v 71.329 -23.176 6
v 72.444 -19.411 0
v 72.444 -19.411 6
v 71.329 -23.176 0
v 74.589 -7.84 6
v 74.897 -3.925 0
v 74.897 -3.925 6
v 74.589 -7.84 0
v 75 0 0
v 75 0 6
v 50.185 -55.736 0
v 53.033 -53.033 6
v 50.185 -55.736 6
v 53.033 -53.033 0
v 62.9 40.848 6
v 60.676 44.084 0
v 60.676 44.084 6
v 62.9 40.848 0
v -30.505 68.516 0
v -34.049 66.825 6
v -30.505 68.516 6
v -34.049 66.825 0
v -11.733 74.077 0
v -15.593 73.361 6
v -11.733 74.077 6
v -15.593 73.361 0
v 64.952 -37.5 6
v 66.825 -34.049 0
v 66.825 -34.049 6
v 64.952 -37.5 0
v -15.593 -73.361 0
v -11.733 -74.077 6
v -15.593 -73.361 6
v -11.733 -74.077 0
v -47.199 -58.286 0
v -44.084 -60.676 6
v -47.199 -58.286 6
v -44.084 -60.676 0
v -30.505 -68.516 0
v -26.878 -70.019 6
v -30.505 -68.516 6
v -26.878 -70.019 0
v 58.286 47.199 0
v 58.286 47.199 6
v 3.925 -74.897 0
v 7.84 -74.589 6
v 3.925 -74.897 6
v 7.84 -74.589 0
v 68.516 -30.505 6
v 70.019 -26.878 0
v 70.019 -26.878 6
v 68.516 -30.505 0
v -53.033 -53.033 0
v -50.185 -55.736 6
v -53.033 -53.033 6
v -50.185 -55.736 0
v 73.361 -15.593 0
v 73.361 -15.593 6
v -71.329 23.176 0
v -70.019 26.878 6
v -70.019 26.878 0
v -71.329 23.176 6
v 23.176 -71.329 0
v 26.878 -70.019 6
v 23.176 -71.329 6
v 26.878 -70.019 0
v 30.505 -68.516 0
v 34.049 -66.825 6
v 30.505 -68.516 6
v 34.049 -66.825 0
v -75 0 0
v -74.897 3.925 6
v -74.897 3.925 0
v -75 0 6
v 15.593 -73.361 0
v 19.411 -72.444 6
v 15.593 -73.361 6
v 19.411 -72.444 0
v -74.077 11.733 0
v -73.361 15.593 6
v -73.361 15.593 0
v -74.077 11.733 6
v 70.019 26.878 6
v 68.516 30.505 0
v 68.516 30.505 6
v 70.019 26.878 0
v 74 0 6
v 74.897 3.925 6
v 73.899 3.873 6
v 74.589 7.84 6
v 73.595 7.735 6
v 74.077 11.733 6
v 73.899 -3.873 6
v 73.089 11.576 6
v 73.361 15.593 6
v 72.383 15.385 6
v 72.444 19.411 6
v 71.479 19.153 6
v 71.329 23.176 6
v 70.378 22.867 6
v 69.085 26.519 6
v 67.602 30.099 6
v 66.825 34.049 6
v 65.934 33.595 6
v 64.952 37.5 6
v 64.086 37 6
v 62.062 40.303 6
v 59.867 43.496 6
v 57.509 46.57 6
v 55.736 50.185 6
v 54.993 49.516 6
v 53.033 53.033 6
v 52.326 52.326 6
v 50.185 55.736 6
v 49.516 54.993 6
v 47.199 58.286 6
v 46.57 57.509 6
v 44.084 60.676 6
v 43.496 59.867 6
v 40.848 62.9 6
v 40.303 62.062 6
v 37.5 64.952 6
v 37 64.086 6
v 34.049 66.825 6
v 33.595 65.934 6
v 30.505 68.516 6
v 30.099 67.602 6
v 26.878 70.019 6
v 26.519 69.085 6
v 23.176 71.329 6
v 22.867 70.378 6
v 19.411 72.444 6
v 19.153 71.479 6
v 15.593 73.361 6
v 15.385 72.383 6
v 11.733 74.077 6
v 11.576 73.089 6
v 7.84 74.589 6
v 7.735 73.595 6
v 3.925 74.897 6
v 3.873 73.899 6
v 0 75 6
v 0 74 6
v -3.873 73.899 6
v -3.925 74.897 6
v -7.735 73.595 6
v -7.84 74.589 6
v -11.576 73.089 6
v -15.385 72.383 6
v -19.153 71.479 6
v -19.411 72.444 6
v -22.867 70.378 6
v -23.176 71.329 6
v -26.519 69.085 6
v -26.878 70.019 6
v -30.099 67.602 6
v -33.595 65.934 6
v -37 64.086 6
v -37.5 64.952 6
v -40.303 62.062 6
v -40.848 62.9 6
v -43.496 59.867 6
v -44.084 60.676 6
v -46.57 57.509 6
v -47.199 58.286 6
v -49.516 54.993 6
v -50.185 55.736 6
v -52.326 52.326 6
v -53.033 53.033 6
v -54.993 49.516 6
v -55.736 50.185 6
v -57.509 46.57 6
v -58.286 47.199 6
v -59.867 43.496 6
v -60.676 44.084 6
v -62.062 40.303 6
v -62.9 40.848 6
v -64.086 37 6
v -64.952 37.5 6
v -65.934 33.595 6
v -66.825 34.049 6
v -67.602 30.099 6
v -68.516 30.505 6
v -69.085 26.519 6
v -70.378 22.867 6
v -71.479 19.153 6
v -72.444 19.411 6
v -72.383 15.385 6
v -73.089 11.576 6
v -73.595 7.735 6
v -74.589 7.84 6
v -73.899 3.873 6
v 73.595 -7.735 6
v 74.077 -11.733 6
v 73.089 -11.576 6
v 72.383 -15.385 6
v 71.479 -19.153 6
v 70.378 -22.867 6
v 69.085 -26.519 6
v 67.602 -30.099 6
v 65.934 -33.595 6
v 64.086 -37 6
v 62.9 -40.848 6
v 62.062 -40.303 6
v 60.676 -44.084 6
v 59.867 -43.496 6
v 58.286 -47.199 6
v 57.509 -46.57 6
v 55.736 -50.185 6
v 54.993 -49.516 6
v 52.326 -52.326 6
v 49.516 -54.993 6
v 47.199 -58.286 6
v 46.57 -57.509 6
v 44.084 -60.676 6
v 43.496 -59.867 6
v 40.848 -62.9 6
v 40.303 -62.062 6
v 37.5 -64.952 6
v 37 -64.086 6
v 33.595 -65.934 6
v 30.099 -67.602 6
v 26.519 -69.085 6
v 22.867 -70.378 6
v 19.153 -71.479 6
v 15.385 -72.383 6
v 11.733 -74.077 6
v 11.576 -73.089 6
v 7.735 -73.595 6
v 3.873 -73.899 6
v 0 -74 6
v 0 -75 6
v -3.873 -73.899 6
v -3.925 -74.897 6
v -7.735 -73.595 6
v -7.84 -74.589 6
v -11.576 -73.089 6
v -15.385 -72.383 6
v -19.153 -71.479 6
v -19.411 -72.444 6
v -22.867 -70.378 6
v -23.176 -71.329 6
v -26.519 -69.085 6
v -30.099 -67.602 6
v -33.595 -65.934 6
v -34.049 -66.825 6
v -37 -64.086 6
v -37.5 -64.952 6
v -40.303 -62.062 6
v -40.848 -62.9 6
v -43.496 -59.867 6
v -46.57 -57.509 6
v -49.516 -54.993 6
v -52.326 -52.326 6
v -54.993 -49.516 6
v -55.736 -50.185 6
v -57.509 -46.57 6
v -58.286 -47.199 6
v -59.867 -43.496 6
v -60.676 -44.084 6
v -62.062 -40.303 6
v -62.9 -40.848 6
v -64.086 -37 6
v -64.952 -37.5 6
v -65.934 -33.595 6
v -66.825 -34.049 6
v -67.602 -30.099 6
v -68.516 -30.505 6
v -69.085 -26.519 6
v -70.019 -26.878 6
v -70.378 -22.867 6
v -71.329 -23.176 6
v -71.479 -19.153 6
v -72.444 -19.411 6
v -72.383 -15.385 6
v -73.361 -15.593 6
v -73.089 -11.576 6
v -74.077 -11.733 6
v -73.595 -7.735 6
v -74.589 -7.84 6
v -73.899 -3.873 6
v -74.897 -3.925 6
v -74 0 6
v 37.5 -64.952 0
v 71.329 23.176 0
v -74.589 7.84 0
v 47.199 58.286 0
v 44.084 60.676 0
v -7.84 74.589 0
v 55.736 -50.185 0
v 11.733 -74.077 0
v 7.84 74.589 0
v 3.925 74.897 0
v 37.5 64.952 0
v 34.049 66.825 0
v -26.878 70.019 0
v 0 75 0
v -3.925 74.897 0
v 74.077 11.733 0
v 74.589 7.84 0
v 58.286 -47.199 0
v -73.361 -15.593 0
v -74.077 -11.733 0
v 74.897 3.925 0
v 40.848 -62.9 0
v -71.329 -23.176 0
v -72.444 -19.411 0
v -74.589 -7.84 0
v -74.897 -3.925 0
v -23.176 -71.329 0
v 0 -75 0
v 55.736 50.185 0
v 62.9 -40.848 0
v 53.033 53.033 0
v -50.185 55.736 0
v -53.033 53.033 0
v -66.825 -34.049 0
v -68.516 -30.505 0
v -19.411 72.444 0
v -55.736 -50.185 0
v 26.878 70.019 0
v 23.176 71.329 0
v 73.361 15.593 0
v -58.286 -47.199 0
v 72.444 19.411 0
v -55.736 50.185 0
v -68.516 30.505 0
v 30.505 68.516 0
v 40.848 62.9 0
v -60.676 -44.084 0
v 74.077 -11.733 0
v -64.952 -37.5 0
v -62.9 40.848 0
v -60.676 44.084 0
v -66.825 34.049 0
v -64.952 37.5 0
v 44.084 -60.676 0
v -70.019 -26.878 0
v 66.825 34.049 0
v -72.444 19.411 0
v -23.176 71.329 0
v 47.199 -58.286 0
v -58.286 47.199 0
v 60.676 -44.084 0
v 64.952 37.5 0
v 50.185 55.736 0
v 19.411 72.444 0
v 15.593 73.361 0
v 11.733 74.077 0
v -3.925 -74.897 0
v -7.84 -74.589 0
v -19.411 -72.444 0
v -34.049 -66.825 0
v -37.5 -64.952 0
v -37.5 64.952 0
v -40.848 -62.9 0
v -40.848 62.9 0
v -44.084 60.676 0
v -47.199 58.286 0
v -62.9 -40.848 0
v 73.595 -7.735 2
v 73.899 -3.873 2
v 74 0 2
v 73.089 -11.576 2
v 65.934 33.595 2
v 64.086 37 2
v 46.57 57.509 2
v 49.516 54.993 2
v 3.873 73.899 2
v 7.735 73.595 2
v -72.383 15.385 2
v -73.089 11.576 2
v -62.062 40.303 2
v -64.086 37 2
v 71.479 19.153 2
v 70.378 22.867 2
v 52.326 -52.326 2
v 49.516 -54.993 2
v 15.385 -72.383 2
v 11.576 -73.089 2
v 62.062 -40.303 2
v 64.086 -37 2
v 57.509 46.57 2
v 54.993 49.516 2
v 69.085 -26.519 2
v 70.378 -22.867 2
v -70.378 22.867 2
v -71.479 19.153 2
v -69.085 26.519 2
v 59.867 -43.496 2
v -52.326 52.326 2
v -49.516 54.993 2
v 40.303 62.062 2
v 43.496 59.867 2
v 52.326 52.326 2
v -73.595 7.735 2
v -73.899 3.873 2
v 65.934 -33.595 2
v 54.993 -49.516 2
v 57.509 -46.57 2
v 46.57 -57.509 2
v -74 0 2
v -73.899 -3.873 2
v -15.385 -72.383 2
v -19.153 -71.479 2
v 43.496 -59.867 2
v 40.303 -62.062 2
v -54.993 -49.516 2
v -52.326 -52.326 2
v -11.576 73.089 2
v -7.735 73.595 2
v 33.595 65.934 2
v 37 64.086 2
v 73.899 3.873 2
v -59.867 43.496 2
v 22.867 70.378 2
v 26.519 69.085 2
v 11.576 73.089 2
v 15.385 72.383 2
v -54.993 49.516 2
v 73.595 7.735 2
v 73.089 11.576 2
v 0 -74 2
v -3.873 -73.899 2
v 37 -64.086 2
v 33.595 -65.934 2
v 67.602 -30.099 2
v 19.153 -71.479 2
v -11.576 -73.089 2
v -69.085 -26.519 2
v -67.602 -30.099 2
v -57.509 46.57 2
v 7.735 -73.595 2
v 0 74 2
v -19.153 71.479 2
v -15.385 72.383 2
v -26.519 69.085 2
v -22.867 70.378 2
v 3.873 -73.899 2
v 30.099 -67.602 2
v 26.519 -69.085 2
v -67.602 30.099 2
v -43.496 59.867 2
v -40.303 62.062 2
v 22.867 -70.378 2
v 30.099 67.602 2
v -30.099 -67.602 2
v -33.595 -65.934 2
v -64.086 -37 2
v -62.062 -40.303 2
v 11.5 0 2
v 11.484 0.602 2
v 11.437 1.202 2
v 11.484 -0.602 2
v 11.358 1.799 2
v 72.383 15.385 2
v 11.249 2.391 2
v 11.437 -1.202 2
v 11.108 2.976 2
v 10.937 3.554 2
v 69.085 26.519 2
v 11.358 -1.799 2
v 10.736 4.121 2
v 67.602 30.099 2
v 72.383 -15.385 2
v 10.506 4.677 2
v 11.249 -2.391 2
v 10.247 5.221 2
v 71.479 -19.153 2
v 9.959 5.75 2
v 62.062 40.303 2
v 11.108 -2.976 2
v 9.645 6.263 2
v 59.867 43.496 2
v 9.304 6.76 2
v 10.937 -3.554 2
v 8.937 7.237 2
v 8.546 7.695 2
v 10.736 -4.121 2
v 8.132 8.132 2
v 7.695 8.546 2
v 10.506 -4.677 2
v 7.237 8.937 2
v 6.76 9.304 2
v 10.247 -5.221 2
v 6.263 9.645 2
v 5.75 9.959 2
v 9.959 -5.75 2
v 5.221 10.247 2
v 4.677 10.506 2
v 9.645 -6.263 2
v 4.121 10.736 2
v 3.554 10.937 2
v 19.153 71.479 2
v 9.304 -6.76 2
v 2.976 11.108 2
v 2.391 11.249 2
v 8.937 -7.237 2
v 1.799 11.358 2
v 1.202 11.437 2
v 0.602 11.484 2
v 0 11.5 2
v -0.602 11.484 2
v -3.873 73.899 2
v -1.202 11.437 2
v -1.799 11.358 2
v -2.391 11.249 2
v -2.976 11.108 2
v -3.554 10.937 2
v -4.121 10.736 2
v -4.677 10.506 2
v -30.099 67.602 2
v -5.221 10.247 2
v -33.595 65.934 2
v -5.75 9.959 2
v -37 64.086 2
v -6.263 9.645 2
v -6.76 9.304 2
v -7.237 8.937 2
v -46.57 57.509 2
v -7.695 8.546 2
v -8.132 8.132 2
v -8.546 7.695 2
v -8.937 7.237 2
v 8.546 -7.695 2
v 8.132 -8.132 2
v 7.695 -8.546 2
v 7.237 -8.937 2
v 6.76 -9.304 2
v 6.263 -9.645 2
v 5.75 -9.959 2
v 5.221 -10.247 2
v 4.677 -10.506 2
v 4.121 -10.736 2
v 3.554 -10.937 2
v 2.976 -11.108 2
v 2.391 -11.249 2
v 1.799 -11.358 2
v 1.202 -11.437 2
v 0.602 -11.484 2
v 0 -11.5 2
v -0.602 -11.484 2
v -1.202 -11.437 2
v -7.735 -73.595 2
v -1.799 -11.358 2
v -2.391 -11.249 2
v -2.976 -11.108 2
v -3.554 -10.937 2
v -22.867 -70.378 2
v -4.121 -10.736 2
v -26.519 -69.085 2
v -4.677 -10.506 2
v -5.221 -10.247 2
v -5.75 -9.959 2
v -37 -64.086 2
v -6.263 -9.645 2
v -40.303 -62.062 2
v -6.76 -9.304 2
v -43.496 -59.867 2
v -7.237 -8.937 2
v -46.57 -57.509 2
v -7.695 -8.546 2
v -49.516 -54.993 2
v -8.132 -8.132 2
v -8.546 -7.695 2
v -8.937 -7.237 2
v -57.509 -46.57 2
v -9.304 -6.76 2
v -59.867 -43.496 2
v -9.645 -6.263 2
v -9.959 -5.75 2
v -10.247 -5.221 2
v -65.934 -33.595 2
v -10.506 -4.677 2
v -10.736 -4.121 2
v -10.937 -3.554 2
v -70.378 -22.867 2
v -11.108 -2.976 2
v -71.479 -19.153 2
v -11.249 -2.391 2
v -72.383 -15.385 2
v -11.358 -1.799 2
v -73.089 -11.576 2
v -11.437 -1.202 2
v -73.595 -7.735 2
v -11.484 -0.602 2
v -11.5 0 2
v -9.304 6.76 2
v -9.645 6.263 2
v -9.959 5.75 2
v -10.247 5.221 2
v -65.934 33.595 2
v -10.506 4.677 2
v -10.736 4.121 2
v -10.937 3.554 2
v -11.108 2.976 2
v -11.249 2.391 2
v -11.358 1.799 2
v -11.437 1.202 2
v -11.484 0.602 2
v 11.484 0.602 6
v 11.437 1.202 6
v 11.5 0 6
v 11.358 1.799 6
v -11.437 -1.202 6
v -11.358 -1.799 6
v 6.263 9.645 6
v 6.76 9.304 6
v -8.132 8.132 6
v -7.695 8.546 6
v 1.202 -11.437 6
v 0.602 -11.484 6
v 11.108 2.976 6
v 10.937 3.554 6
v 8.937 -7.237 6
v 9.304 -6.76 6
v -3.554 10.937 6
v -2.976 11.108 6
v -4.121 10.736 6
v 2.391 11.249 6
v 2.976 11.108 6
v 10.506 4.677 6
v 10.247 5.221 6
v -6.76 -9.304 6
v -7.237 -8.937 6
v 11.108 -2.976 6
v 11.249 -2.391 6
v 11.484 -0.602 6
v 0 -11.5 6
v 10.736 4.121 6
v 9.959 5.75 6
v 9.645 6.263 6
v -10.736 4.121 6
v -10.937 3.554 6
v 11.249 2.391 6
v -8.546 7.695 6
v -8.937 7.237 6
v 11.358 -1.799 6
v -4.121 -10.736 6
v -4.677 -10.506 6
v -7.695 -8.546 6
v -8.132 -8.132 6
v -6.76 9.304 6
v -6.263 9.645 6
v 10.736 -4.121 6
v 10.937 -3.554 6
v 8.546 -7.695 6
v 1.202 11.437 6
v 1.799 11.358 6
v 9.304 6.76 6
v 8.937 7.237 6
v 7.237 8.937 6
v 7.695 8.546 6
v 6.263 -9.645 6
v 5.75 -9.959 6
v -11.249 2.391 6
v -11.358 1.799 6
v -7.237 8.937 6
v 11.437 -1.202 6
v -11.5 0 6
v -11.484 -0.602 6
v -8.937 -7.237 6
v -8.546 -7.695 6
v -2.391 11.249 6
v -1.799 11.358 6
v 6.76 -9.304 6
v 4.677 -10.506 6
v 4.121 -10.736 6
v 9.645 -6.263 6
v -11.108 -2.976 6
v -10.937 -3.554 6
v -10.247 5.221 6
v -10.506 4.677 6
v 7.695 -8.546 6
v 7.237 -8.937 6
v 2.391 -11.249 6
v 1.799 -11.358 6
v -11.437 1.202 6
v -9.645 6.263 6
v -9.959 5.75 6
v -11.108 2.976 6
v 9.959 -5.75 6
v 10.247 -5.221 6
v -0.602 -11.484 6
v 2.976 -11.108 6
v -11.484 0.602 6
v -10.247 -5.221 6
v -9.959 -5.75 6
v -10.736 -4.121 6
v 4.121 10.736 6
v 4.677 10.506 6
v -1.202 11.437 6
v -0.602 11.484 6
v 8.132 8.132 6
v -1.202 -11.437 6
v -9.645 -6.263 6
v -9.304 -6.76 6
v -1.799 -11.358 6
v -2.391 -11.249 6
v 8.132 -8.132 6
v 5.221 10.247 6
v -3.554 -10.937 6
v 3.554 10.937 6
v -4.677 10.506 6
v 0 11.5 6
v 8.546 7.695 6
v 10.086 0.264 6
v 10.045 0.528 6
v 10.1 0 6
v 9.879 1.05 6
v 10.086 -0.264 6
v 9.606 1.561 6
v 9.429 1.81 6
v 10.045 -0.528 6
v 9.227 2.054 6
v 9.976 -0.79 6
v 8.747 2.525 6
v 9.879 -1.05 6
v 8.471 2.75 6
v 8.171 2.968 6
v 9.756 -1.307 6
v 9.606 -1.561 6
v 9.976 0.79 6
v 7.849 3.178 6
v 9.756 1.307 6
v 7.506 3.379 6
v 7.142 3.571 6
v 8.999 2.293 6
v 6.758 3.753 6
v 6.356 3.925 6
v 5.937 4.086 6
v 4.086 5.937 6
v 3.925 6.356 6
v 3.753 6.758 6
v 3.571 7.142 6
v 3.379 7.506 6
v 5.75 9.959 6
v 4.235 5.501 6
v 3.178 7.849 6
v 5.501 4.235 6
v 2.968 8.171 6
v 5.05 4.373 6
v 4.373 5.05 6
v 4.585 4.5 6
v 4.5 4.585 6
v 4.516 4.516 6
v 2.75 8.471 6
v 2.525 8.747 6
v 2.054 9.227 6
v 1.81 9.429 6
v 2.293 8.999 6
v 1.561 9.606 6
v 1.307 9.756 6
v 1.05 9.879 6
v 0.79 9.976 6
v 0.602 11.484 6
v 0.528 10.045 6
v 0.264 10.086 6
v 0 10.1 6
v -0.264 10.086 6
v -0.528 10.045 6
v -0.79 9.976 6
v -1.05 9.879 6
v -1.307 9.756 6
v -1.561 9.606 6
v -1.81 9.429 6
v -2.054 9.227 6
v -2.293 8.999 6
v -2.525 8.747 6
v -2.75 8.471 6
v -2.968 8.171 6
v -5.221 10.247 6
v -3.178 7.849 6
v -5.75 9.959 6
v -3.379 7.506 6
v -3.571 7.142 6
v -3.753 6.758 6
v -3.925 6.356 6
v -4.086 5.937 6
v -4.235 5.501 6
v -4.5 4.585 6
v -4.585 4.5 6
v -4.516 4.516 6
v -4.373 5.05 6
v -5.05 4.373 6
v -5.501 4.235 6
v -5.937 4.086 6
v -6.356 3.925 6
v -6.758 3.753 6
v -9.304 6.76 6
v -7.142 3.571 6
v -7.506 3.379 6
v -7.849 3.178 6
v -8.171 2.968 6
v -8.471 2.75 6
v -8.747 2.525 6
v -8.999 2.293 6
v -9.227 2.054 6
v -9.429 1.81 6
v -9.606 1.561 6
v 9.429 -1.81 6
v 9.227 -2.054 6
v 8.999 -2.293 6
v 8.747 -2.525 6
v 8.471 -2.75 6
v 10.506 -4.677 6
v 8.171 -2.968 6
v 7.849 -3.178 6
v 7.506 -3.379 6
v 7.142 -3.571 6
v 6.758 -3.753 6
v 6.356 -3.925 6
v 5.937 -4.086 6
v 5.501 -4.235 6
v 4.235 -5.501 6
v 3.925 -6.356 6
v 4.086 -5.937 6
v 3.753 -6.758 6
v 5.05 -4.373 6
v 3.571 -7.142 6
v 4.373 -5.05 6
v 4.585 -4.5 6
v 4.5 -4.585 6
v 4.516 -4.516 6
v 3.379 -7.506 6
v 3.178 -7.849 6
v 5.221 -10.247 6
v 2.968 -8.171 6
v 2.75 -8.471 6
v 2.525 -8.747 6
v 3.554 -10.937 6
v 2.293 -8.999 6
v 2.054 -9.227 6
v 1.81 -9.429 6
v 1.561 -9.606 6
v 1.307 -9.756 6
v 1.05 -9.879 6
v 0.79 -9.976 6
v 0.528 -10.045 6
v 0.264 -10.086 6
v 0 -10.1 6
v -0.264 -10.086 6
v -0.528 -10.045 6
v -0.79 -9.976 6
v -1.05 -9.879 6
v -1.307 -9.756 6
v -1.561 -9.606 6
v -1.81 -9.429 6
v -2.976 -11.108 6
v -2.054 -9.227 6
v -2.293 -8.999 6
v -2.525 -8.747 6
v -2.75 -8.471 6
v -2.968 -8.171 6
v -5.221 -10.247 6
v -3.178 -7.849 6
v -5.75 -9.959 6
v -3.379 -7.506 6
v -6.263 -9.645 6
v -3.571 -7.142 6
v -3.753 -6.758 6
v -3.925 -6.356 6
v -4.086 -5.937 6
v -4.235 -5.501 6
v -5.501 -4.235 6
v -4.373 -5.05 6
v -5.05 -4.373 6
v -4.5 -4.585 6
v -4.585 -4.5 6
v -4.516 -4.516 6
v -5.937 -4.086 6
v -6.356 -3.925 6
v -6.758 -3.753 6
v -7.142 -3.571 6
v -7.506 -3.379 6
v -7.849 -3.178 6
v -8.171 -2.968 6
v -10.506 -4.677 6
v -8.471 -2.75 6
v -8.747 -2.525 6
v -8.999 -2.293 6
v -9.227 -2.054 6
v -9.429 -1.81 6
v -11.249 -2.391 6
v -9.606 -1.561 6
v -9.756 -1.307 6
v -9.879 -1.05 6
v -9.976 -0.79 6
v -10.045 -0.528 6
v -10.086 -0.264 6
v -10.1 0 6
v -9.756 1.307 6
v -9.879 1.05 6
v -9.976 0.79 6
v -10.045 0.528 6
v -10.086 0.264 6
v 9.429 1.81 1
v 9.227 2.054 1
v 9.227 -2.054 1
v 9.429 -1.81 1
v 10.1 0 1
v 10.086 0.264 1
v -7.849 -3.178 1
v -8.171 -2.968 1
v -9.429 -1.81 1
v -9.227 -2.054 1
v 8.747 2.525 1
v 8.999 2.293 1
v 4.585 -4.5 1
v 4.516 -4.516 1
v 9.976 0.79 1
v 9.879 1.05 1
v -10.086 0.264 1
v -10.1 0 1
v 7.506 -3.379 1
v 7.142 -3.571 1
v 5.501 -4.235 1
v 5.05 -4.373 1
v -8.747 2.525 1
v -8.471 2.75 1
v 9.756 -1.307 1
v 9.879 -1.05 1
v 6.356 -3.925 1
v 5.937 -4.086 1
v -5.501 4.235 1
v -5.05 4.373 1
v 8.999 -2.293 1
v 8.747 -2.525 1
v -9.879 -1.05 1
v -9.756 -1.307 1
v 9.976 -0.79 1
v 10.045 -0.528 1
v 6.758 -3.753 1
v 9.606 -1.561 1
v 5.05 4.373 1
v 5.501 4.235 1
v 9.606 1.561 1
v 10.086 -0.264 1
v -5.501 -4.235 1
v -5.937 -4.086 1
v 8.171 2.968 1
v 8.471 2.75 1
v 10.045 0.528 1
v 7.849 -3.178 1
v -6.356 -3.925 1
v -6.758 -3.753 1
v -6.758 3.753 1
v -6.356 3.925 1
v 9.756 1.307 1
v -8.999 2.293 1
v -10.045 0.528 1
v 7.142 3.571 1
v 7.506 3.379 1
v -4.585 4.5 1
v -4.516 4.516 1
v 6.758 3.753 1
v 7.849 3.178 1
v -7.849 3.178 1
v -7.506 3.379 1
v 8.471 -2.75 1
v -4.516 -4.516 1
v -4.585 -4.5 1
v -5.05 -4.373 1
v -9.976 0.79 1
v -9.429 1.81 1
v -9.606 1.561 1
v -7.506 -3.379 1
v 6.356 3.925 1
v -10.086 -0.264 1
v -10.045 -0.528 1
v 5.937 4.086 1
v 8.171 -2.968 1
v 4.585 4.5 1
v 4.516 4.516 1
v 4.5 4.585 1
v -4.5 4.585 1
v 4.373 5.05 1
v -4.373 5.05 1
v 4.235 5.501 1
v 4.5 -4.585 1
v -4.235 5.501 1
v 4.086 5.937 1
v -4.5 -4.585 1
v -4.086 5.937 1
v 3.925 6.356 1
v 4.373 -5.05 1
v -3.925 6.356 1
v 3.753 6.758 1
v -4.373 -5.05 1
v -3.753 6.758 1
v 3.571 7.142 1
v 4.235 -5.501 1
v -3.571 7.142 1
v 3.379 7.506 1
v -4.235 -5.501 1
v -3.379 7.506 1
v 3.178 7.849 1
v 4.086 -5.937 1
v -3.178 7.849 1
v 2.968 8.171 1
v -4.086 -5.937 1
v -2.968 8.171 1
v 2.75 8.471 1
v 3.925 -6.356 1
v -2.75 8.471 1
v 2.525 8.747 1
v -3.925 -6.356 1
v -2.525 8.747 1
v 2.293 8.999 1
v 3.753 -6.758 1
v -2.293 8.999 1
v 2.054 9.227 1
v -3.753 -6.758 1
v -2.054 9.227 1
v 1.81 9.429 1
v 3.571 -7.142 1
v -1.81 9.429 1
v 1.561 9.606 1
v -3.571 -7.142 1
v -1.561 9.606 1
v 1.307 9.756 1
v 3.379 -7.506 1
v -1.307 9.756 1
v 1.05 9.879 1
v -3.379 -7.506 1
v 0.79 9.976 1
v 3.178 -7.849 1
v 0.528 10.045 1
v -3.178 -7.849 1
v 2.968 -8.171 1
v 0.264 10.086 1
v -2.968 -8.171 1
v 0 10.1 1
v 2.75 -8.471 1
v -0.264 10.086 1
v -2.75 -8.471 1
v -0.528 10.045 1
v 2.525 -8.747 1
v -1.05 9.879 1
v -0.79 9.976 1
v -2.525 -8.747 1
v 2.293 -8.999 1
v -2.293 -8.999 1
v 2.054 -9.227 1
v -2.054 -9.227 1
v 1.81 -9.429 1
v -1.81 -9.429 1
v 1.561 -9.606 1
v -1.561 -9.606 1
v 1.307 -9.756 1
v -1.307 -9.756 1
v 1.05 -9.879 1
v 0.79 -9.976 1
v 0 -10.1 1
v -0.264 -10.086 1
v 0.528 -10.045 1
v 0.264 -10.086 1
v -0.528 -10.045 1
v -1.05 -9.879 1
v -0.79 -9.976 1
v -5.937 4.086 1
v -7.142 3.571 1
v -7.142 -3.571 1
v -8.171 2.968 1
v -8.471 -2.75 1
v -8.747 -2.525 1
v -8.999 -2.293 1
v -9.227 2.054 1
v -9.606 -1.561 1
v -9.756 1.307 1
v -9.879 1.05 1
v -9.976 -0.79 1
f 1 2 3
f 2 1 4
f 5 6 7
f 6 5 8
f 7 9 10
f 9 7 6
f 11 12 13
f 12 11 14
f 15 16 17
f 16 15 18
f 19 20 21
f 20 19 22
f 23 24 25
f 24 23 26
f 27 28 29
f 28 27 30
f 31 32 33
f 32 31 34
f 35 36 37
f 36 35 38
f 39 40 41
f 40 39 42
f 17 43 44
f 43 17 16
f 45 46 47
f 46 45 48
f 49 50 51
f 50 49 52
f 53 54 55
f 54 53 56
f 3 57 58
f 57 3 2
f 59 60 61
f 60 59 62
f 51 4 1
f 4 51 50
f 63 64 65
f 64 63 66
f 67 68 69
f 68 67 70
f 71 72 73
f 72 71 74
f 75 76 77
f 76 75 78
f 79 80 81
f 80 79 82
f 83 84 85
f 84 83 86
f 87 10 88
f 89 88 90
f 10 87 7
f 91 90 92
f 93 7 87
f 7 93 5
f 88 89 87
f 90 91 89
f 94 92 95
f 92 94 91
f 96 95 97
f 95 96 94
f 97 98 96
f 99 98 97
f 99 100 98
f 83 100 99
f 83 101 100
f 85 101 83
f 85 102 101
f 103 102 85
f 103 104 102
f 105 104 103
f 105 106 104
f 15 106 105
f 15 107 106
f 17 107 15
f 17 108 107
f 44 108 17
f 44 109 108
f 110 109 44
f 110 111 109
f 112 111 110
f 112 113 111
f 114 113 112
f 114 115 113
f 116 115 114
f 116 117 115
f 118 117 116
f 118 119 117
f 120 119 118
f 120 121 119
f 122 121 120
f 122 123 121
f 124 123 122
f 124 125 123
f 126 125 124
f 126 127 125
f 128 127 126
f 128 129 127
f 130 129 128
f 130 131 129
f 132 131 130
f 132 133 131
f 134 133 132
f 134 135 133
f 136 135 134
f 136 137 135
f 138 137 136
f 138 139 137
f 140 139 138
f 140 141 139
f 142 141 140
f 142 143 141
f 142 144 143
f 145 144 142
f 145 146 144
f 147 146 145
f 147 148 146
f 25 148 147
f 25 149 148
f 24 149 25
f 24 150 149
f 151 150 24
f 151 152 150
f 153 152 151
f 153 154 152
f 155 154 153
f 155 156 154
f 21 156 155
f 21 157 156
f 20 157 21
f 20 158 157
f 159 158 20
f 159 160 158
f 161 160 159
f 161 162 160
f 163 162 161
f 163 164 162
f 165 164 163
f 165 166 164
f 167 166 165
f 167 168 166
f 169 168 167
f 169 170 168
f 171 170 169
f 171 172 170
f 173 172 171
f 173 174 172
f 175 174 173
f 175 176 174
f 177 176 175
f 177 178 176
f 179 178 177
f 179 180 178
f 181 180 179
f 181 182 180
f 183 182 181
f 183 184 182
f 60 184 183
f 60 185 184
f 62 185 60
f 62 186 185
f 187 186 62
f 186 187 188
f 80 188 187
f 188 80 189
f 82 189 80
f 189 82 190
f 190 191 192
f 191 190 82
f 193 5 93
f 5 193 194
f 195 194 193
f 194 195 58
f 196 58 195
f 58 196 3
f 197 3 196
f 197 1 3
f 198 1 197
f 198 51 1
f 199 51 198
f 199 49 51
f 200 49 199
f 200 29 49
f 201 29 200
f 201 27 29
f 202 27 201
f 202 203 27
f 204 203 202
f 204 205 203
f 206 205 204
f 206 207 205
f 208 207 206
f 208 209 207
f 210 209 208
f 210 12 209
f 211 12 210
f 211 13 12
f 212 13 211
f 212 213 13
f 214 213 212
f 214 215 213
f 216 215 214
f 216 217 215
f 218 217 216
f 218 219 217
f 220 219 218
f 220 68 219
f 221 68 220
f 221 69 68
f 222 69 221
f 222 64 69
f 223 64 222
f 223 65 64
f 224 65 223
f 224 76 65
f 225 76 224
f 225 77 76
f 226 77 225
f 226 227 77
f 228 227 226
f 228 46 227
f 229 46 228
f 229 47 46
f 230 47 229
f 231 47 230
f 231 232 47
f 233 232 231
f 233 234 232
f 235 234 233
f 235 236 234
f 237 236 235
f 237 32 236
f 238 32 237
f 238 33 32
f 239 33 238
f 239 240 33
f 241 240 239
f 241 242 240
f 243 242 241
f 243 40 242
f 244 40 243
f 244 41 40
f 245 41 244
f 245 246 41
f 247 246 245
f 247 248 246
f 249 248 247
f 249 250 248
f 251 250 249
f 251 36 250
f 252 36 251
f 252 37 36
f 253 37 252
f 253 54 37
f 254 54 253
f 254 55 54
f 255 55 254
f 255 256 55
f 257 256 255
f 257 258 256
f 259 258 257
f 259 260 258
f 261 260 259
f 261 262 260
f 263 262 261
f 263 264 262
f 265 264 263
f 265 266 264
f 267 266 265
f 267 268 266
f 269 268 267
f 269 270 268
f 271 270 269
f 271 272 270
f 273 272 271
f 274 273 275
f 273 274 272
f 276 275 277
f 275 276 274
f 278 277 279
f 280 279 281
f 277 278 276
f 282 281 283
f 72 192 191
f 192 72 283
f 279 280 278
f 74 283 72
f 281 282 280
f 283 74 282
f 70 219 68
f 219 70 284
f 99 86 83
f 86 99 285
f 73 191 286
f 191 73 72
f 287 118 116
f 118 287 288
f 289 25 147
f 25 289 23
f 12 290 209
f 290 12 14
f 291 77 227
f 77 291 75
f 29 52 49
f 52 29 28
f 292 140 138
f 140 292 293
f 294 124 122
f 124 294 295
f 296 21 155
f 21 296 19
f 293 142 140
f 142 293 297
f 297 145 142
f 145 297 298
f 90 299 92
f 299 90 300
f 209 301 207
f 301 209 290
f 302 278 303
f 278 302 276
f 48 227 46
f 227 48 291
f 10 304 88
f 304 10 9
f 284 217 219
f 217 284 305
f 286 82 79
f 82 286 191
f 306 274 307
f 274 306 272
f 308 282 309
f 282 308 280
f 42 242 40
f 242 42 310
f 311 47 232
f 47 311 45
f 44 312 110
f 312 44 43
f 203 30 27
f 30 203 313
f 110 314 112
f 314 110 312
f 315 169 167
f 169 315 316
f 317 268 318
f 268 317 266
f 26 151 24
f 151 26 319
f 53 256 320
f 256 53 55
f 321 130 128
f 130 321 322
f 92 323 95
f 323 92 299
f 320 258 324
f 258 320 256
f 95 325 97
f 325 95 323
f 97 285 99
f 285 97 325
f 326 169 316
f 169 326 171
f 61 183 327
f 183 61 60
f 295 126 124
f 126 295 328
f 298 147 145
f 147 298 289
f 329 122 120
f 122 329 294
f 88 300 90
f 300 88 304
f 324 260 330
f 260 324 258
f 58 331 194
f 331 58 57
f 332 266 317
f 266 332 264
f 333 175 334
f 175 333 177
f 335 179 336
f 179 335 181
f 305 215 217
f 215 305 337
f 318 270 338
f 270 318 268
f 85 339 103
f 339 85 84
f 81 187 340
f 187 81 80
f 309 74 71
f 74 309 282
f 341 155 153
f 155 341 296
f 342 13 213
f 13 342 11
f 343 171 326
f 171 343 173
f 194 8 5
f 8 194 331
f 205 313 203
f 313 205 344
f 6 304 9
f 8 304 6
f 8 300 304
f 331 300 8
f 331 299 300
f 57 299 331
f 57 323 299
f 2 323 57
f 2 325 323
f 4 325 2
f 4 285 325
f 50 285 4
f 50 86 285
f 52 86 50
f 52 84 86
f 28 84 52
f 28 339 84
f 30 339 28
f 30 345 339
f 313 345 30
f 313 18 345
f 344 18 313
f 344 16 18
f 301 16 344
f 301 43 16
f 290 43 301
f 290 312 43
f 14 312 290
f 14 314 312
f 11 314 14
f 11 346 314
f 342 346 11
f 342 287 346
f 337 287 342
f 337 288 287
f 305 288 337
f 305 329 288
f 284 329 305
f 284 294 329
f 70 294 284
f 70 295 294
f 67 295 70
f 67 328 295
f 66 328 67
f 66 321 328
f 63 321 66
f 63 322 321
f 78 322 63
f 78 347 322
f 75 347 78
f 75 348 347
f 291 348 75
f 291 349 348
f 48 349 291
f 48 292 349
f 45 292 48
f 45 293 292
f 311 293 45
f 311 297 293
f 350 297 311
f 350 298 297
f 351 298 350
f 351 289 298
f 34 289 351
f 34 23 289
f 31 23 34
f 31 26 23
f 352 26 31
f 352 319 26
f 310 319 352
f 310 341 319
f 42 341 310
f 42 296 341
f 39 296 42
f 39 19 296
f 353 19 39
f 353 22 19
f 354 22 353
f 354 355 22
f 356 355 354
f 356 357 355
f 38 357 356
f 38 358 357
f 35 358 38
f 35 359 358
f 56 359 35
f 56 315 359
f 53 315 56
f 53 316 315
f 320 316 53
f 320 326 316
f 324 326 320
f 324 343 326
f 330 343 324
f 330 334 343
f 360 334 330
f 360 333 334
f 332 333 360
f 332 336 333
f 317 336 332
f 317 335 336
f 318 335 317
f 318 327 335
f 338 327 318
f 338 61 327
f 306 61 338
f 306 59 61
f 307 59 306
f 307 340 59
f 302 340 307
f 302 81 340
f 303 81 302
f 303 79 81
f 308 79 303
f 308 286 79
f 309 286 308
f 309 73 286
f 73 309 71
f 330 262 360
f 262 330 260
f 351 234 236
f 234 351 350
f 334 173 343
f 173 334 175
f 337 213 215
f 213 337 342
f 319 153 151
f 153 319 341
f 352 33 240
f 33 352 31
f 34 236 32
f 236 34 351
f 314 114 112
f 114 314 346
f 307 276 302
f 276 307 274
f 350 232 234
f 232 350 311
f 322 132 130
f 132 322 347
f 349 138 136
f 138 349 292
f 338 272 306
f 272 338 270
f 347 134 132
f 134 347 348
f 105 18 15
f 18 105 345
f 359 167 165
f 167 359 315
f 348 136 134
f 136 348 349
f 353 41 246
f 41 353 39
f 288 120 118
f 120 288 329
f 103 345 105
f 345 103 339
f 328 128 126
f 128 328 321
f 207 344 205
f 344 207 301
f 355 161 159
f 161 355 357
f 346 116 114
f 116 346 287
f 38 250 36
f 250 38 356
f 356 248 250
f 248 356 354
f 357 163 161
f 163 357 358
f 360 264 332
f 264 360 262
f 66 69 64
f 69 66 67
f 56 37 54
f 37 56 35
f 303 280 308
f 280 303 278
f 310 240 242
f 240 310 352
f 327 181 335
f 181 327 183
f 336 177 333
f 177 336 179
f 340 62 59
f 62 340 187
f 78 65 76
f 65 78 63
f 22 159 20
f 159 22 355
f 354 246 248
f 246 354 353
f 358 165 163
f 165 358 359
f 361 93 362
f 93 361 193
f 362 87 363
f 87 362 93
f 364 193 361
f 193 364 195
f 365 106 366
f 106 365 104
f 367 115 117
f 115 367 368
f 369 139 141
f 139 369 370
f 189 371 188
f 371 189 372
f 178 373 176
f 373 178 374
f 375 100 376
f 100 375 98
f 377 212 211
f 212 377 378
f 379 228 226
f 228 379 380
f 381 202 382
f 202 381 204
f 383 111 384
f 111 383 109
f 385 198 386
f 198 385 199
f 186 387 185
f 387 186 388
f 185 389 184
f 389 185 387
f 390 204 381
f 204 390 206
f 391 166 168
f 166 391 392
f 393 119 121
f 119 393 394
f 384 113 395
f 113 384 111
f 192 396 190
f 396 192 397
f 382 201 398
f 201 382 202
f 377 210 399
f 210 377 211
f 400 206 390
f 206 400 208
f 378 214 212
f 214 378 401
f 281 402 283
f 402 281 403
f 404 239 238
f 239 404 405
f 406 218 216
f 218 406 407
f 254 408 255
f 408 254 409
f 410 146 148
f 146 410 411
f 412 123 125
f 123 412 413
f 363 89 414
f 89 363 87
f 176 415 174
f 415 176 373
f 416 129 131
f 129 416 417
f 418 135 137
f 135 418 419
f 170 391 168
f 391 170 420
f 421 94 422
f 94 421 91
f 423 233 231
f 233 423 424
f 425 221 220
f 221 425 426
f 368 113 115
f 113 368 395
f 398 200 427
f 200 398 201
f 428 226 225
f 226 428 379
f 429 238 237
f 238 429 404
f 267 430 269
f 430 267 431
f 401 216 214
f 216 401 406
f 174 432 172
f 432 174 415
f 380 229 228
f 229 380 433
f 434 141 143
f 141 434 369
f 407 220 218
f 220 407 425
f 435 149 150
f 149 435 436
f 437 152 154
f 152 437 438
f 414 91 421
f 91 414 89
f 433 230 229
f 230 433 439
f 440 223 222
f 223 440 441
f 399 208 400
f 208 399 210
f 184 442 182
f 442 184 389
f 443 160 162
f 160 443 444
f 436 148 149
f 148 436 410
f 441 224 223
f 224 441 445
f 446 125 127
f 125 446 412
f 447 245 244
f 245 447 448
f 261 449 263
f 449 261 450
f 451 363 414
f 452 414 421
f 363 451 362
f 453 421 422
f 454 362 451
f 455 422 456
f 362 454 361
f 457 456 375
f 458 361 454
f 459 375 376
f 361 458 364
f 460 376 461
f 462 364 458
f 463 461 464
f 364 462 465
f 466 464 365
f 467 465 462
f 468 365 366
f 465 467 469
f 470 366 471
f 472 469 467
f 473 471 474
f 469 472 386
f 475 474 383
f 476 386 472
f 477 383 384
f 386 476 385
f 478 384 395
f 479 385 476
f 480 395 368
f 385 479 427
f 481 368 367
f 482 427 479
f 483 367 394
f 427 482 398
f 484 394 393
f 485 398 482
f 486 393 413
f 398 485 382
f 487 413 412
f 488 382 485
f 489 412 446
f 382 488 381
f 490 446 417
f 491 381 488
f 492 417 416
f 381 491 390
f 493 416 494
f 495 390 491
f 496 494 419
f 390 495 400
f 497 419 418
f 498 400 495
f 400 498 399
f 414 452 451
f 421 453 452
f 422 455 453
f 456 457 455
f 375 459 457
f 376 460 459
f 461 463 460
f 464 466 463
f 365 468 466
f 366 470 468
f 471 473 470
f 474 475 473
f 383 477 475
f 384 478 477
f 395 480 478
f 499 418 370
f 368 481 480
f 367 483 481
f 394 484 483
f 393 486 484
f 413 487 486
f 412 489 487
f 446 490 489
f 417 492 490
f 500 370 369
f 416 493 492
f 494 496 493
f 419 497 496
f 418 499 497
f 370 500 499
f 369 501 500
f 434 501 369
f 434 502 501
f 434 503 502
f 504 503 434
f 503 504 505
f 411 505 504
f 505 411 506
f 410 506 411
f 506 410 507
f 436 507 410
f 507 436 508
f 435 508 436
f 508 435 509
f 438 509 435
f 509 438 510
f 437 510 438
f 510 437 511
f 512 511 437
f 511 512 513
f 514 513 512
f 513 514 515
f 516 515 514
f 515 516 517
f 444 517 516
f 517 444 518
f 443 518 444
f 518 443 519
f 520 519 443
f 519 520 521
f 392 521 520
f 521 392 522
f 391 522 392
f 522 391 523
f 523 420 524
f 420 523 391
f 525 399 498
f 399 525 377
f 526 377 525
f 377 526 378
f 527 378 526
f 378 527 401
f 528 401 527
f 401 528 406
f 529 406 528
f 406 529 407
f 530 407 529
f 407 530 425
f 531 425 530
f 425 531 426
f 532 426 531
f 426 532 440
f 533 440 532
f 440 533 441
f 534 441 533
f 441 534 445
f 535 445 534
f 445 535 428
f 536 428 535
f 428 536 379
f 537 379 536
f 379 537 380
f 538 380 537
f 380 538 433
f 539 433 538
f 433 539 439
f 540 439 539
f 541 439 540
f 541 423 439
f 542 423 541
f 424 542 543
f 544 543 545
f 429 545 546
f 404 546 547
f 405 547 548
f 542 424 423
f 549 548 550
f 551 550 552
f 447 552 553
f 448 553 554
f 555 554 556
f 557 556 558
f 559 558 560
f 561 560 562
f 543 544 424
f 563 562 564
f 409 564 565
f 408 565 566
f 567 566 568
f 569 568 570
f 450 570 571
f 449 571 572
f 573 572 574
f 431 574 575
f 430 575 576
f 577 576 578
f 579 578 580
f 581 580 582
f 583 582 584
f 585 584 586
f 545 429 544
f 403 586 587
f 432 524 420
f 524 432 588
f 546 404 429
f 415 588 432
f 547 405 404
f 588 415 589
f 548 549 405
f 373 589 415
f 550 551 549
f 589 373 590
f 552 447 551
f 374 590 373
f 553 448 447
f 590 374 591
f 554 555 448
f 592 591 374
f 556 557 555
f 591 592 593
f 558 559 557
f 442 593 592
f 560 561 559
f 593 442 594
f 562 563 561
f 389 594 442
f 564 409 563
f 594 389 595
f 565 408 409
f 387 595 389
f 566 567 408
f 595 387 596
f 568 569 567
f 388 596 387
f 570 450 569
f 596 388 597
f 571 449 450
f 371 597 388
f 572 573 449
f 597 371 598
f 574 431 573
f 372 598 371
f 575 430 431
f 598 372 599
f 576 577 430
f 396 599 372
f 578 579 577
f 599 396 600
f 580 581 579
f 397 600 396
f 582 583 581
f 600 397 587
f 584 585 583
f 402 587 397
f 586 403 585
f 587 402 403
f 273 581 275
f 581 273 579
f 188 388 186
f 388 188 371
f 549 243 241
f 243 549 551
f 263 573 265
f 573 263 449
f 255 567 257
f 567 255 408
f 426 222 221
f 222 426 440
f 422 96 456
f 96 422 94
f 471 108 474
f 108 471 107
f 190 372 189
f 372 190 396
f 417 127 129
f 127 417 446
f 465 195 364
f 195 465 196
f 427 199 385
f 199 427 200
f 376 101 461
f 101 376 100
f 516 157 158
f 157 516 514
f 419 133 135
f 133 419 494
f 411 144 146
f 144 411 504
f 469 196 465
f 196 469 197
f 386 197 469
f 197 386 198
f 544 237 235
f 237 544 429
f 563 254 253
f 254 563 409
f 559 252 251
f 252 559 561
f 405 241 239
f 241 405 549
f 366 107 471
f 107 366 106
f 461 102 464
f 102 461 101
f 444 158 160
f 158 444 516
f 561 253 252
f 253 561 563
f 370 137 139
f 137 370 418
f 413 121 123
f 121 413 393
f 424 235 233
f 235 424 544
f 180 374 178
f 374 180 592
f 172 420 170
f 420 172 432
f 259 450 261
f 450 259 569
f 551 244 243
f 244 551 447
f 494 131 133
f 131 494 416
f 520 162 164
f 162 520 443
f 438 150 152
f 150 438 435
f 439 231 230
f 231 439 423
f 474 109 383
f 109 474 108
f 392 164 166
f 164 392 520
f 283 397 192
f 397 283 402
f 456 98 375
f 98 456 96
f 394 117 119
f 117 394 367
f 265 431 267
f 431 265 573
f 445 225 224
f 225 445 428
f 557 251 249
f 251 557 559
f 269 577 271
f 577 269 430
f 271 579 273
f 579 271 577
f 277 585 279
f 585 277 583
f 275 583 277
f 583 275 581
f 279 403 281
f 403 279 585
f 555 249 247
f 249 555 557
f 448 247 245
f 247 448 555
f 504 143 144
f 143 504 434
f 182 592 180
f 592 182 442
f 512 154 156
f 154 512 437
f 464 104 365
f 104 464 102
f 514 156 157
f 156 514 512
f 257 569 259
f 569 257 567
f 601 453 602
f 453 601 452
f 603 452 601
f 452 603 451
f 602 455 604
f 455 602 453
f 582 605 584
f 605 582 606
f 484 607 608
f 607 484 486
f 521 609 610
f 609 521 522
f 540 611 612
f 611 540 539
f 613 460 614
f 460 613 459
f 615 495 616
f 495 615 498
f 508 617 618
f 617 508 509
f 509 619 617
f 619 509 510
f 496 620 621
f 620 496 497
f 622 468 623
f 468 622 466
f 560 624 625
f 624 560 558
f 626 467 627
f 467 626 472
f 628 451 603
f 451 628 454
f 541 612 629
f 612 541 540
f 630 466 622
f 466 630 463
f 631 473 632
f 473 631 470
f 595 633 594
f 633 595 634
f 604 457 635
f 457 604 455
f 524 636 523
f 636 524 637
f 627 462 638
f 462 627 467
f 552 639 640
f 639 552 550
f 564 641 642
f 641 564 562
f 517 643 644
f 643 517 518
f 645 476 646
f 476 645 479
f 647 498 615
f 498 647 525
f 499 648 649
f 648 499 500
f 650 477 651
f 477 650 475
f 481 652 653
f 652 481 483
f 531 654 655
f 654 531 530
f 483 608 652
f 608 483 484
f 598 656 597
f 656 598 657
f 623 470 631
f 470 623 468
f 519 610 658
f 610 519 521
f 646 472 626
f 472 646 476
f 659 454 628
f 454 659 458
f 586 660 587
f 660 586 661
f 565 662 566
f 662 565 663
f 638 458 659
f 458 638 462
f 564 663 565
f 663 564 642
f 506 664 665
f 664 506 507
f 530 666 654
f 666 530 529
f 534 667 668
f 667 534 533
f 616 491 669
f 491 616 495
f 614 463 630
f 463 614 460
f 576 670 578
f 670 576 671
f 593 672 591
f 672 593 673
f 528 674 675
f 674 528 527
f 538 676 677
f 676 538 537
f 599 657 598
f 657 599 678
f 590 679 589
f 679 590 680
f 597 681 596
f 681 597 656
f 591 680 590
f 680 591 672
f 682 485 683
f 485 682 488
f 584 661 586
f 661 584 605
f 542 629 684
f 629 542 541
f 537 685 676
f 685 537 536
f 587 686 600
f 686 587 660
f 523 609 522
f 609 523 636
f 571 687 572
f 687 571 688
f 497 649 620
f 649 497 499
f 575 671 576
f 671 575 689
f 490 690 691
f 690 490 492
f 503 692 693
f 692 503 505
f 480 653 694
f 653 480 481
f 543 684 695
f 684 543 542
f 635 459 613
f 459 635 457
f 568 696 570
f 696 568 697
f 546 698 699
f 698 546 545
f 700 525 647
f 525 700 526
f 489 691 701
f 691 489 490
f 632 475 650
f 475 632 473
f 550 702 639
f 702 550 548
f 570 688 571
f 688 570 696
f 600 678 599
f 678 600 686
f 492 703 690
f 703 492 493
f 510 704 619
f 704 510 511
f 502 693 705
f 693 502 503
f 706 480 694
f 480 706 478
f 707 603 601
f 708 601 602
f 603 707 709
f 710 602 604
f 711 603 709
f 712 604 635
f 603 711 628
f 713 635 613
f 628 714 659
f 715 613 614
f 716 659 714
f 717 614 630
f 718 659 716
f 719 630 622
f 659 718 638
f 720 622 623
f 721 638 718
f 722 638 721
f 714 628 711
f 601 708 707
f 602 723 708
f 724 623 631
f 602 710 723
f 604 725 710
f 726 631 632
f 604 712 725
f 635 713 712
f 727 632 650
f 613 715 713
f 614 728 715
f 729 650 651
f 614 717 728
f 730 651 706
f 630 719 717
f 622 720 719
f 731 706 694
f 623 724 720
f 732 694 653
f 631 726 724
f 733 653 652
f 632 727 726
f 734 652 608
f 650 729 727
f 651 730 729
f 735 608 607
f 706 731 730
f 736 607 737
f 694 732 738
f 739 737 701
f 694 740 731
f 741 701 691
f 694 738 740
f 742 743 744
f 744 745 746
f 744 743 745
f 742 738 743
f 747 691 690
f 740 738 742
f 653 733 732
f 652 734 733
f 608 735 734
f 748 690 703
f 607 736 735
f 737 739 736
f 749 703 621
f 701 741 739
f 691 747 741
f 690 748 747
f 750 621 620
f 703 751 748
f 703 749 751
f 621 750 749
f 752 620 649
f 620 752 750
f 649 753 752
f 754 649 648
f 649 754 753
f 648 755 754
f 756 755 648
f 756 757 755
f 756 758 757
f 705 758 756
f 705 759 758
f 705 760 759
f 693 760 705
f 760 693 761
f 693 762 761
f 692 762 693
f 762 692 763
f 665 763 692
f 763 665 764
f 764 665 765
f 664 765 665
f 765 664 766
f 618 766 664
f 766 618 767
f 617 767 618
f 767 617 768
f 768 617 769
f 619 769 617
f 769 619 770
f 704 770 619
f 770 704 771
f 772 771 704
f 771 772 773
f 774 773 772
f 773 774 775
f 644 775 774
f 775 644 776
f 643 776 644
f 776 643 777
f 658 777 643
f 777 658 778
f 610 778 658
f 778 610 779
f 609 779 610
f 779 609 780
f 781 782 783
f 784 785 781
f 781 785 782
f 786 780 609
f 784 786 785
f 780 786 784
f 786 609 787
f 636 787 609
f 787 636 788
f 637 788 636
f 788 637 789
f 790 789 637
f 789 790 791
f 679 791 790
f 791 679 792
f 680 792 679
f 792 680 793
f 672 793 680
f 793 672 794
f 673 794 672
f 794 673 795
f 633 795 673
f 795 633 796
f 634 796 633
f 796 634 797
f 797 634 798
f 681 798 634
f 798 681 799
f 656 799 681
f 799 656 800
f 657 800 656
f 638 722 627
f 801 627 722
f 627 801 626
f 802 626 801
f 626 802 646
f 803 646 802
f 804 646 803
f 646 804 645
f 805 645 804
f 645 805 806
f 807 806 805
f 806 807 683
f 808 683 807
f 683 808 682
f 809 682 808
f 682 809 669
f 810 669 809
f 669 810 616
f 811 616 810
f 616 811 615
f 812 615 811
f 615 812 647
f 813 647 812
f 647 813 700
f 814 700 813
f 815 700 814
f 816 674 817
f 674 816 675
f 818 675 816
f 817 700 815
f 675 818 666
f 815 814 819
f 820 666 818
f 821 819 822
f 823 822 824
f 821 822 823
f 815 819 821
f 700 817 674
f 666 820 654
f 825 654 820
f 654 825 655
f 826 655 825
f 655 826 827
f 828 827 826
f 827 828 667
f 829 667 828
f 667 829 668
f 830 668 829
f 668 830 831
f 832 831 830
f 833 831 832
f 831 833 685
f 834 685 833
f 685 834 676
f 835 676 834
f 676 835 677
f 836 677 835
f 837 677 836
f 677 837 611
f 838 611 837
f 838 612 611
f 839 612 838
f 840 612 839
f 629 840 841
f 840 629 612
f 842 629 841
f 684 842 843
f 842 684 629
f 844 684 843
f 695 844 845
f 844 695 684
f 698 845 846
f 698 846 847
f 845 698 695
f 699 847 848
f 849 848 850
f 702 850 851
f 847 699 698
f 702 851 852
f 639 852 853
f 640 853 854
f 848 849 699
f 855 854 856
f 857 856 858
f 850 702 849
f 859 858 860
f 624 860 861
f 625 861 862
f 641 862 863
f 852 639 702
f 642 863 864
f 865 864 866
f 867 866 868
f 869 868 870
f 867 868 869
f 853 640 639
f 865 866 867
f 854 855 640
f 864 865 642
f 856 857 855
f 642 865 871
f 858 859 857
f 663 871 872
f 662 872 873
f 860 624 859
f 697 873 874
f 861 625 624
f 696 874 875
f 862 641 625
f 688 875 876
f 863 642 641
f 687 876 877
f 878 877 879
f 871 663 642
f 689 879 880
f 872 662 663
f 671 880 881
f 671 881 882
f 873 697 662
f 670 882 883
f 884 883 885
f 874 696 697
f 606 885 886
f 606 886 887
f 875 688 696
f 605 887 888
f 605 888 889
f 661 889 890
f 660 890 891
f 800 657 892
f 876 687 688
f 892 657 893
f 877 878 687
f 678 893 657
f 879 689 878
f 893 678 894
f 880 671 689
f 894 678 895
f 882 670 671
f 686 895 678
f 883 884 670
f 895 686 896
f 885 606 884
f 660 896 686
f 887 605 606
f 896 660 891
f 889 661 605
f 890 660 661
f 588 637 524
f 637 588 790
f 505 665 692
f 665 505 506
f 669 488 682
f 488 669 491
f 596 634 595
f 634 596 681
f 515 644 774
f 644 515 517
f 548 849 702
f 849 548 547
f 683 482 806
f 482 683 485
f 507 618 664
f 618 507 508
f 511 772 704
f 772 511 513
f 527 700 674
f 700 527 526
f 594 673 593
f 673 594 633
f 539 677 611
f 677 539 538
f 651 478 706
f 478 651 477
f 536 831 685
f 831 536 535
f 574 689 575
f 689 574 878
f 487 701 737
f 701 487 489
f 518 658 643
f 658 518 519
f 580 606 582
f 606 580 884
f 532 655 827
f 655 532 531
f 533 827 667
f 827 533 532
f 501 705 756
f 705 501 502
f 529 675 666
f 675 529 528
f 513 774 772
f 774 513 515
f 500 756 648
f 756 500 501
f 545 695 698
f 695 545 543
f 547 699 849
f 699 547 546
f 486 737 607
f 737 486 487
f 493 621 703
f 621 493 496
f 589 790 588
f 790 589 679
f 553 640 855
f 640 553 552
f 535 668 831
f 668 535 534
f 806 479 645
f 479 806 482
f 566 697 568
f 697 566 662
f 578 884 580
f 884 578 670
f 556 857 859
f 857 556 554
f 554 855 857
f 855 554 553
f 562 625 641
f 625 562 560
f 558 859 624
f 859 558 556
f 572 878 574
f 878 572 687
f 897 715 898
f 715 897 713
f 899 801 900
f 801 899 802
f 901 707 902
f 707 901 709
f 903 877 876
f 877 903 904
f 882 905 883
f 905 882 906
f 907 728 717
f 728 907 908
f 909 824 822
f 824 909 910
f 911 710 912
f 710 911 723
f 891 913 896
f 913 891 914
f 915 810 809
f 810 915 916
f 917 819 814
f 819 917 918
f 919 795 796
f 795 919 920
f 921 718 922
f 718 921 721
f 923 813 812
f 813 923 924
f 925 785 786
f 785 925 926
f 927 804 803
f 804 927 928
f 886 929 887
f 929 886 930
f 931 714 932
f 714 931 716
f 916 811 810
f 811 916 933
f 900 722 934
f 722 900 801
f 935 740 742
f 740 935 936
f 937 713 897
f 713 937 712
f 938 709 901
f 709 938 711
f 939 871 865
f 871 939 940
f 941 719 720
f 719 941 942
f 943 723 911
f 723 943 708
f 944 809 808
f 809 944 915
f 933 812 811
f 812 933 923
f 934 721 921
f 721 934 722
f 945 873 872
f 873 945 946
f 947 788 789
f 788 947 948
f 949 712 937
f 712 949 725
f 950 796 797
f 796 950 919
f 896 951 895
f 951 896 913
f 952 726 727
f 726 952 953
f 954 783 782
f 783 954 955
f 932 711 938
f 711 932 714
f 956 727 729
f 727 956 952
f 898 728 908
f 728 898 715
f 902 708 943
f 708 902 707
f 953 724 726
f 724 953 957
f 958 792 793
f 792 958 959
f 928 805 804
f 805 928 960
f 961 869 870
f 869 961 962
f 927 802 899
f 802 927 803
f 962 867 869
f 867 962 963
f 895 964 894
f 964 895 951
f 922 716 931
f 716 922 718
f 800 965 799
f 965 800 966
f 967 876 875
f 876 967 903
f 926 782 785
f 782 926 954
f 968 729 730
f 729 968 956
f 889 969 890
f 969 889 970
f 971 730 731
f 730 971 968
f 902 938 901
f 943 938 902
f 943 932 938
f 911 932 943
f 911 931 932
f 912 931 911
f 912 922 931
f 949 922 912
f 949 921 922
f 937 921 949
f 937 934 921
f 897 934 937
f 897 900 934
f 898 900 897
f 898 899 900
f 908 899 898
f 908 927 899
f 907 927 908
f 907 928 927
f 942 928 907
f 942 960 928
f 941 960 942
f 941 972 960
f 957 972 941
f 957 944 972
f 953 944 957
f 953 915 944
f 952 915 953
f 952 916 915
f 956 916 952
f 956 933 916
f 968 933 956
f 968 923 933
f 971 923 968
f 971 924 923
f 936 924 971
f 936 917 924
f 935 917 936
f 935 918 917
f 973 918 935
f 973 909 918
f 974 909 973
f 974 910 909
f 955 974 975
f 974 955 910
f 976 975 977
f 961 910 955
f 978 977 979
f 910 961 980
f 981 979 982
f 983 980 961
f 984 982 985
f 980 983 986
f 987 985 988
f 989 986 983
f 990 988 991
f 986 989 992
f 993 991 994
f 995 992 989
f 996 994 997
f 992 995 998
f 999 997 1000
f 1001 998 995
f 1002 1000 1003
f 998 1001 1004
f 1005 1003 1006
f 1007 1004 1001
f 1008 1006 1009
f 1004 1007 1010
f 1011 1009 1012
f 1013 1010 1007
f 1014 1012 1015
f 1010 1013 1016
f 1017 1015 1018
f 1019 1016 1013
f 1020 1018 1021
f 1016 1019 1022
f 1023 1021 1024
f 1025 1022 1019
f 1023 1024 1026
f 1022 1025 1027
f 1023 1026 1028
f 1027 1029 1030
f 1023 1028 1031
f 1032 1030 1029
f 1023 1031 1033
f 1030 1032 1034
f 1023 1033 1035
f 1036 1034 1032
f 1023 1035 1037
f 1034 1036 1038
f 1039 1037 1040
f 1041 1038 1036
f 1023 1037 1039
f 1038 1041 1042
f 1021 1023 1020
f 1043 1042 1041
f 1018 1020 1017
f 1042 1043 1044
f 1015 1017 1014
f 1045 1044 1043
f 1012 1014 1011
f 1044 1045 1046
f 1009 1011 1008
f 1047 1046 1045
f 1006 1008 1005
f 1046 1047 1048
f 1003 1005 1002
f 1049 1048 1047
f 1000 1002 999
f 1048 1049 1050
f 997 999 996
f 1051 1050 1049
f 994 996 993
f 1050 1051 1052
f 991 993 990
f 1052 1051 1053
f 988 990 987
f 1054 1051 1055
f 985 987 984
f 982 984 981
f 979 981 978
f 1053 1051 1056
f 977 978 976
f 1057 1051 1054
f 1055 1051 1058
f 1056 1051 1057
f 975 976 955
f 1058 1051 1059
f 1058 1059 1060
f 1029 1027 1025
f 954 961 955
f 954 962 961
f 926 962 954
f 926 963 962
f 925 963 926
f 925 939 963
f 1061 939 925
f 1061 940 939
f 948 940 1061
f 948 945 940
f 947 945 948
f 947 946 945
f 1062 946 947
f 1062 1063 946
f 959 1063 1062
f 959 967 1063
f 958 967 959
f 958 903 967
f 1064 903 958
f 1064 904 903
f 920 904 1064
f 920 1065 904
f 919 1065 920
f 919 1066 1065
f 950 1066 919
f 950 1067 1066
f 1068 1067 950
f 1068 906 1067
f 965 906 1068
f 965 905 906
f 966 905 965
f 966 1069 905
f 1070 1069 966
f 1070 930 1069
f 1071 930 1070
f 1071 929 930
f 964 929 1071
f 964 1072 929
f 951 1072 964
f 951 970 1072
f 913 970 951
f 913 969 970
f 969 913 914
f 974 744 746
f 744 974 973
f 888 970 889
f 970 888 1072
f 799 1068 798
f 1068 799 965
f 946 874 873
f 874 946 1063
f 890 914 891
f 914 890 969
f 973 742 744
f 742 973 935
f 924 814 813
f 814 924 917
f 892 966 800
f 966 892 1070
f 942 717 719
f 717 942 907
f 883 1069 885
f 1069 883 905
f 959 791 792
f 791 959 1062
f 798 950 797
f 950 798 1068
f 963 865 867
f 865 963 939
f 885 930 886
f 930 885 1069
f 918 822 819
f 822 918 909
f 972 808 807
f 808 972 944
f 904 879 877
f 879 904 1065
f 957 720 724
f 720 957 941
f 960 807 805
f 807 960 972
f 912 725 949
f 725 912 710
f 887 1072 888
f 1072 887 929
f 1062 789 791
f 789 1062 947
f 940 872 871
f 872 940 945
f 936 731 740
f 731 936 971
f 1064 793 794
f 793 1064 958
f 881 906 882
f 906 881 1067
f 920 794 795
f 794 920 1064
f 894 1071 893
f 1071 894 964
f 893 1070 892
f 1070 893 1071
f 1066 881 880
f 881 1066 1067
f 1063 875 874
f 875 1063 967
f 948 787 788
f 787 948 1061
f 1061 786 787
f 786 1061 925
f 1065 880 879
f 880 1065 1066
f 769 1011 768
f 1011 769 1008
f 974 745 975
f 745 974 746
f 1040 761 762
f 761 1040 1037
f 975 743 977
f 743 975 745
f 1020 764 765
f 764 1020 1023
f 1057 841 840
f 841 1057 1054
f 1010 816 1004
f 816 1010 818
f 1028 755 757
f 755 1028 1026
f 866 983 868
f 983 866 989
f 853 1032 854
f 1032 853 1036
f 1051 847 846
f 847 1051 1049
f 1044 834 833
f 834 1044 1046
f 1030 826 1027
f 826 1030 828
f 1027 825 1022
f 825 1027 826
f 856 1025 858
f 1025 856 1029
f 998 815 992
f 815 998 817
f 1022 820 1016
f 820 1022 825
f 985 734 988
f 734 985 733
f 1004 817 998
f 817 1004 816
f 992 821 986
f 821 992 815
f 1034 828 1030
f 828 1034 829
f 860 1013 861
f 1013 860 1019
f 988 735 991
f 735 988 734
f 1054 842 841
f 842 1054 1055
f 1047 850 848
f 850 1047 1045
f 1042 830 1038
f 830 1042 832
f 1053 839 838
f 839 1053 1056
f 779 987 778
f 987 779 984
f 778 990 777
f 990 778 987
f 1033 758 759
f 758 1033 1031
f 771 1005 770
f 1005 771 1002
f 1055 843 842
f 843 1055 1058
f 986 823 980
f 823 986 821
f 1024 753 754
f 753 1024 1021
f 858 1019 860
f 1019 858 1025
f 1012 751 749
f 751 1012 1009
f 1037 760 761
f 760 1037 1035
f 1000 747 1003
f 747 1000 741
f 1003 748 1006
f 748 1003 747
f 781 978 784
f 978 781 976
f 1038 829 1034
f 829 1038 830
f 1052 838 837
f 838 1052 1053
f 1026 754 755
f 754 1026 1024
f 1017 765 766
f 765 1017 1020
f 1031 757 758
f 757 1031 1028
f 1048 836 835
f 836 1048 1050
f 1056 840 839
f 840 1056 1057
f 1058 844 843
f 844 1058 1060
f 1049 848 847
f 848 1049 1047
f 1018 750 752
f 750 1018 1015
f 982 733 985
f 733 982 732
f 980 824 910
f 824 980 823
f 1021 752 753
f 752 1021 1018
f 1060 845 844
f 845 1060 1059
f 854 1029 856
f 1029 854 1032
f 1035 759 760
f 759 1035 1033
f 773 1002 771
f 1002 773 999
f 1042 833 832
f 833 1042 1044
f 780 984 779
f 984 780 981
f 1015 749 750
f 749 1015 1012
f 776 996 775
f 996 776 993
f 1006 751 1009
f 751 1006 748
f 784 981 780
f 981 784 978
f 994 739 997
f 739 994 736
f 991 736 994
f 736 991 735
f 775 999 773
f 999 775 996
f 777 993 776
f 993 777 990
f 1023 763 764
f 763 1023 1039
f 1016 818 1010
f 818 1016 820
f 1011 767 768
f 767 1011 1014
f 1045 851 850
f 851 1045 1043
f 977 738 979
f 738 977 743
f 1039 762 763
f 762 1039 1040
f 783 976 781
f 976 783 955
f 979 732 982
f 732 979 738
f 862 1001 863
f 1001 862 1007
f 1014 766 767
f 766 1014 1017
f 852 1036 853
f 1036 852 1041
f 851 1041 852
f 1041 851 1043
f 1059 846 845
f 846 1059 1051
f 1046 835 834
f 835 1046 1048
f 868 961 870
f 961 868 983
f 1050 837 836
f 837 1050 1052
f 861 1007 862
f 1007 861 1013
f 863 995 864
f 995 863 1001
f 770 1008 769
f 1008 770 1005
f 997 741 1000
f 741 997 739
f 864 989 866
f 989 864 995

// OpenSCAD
// file: motorCoupler.scad
$fn = 60;

module motorShaft(height = 5){
    difference(){
        cylinder(d = 5, h = height, center = true);
        translate([4, 0, 0]){
            cube(height, center = true);
        }
        translate([-4, 0, 0]){
            cube(height, center = true);
        }
    }
}

module motorCoupler(){
    translate([0, 0, 8]){
        rotate([180, 0, 0]){
            difference(){
                cylinder(d = 10, h = 5);
                translate([0, 0, 2.5]){
                    motorShaft();
                }
            }

            translate([0, 0, 5]){
                resize([20, 10, 3]){
                    cylinder(d = 20, h =3);
                }
                resize([10, 20, 3]){
                    cylinder(d = 20, h =3);
                }
            }
        }
    }
}

//motorCoupler();
// main file
include <motorCoupler.scad>;
$fn= 120;

//make the topPlate slightly bigger than the motorCoupler by 1%
factor = 1.01;
wallThickness = 2; 

topDiameter = 150;
topHeight = 6;

difference(){
    union(){
        translate([0, 0, topHeight]){
            rotate([180, 0, 0]){
                difference(){
                    cylinder(d = topDiameter, h = topHeight);
                    cylinder(d = topDiameter-wallThickness, h = topHeight-wallThickness);
                }
            }
        }
        cylinder(d = 23, h = topHeight);
    }
    
    translate([0, 0, 1]){
        scale([factor, factor, 2]){
            motorCoupler();
            }
    }
    
}
